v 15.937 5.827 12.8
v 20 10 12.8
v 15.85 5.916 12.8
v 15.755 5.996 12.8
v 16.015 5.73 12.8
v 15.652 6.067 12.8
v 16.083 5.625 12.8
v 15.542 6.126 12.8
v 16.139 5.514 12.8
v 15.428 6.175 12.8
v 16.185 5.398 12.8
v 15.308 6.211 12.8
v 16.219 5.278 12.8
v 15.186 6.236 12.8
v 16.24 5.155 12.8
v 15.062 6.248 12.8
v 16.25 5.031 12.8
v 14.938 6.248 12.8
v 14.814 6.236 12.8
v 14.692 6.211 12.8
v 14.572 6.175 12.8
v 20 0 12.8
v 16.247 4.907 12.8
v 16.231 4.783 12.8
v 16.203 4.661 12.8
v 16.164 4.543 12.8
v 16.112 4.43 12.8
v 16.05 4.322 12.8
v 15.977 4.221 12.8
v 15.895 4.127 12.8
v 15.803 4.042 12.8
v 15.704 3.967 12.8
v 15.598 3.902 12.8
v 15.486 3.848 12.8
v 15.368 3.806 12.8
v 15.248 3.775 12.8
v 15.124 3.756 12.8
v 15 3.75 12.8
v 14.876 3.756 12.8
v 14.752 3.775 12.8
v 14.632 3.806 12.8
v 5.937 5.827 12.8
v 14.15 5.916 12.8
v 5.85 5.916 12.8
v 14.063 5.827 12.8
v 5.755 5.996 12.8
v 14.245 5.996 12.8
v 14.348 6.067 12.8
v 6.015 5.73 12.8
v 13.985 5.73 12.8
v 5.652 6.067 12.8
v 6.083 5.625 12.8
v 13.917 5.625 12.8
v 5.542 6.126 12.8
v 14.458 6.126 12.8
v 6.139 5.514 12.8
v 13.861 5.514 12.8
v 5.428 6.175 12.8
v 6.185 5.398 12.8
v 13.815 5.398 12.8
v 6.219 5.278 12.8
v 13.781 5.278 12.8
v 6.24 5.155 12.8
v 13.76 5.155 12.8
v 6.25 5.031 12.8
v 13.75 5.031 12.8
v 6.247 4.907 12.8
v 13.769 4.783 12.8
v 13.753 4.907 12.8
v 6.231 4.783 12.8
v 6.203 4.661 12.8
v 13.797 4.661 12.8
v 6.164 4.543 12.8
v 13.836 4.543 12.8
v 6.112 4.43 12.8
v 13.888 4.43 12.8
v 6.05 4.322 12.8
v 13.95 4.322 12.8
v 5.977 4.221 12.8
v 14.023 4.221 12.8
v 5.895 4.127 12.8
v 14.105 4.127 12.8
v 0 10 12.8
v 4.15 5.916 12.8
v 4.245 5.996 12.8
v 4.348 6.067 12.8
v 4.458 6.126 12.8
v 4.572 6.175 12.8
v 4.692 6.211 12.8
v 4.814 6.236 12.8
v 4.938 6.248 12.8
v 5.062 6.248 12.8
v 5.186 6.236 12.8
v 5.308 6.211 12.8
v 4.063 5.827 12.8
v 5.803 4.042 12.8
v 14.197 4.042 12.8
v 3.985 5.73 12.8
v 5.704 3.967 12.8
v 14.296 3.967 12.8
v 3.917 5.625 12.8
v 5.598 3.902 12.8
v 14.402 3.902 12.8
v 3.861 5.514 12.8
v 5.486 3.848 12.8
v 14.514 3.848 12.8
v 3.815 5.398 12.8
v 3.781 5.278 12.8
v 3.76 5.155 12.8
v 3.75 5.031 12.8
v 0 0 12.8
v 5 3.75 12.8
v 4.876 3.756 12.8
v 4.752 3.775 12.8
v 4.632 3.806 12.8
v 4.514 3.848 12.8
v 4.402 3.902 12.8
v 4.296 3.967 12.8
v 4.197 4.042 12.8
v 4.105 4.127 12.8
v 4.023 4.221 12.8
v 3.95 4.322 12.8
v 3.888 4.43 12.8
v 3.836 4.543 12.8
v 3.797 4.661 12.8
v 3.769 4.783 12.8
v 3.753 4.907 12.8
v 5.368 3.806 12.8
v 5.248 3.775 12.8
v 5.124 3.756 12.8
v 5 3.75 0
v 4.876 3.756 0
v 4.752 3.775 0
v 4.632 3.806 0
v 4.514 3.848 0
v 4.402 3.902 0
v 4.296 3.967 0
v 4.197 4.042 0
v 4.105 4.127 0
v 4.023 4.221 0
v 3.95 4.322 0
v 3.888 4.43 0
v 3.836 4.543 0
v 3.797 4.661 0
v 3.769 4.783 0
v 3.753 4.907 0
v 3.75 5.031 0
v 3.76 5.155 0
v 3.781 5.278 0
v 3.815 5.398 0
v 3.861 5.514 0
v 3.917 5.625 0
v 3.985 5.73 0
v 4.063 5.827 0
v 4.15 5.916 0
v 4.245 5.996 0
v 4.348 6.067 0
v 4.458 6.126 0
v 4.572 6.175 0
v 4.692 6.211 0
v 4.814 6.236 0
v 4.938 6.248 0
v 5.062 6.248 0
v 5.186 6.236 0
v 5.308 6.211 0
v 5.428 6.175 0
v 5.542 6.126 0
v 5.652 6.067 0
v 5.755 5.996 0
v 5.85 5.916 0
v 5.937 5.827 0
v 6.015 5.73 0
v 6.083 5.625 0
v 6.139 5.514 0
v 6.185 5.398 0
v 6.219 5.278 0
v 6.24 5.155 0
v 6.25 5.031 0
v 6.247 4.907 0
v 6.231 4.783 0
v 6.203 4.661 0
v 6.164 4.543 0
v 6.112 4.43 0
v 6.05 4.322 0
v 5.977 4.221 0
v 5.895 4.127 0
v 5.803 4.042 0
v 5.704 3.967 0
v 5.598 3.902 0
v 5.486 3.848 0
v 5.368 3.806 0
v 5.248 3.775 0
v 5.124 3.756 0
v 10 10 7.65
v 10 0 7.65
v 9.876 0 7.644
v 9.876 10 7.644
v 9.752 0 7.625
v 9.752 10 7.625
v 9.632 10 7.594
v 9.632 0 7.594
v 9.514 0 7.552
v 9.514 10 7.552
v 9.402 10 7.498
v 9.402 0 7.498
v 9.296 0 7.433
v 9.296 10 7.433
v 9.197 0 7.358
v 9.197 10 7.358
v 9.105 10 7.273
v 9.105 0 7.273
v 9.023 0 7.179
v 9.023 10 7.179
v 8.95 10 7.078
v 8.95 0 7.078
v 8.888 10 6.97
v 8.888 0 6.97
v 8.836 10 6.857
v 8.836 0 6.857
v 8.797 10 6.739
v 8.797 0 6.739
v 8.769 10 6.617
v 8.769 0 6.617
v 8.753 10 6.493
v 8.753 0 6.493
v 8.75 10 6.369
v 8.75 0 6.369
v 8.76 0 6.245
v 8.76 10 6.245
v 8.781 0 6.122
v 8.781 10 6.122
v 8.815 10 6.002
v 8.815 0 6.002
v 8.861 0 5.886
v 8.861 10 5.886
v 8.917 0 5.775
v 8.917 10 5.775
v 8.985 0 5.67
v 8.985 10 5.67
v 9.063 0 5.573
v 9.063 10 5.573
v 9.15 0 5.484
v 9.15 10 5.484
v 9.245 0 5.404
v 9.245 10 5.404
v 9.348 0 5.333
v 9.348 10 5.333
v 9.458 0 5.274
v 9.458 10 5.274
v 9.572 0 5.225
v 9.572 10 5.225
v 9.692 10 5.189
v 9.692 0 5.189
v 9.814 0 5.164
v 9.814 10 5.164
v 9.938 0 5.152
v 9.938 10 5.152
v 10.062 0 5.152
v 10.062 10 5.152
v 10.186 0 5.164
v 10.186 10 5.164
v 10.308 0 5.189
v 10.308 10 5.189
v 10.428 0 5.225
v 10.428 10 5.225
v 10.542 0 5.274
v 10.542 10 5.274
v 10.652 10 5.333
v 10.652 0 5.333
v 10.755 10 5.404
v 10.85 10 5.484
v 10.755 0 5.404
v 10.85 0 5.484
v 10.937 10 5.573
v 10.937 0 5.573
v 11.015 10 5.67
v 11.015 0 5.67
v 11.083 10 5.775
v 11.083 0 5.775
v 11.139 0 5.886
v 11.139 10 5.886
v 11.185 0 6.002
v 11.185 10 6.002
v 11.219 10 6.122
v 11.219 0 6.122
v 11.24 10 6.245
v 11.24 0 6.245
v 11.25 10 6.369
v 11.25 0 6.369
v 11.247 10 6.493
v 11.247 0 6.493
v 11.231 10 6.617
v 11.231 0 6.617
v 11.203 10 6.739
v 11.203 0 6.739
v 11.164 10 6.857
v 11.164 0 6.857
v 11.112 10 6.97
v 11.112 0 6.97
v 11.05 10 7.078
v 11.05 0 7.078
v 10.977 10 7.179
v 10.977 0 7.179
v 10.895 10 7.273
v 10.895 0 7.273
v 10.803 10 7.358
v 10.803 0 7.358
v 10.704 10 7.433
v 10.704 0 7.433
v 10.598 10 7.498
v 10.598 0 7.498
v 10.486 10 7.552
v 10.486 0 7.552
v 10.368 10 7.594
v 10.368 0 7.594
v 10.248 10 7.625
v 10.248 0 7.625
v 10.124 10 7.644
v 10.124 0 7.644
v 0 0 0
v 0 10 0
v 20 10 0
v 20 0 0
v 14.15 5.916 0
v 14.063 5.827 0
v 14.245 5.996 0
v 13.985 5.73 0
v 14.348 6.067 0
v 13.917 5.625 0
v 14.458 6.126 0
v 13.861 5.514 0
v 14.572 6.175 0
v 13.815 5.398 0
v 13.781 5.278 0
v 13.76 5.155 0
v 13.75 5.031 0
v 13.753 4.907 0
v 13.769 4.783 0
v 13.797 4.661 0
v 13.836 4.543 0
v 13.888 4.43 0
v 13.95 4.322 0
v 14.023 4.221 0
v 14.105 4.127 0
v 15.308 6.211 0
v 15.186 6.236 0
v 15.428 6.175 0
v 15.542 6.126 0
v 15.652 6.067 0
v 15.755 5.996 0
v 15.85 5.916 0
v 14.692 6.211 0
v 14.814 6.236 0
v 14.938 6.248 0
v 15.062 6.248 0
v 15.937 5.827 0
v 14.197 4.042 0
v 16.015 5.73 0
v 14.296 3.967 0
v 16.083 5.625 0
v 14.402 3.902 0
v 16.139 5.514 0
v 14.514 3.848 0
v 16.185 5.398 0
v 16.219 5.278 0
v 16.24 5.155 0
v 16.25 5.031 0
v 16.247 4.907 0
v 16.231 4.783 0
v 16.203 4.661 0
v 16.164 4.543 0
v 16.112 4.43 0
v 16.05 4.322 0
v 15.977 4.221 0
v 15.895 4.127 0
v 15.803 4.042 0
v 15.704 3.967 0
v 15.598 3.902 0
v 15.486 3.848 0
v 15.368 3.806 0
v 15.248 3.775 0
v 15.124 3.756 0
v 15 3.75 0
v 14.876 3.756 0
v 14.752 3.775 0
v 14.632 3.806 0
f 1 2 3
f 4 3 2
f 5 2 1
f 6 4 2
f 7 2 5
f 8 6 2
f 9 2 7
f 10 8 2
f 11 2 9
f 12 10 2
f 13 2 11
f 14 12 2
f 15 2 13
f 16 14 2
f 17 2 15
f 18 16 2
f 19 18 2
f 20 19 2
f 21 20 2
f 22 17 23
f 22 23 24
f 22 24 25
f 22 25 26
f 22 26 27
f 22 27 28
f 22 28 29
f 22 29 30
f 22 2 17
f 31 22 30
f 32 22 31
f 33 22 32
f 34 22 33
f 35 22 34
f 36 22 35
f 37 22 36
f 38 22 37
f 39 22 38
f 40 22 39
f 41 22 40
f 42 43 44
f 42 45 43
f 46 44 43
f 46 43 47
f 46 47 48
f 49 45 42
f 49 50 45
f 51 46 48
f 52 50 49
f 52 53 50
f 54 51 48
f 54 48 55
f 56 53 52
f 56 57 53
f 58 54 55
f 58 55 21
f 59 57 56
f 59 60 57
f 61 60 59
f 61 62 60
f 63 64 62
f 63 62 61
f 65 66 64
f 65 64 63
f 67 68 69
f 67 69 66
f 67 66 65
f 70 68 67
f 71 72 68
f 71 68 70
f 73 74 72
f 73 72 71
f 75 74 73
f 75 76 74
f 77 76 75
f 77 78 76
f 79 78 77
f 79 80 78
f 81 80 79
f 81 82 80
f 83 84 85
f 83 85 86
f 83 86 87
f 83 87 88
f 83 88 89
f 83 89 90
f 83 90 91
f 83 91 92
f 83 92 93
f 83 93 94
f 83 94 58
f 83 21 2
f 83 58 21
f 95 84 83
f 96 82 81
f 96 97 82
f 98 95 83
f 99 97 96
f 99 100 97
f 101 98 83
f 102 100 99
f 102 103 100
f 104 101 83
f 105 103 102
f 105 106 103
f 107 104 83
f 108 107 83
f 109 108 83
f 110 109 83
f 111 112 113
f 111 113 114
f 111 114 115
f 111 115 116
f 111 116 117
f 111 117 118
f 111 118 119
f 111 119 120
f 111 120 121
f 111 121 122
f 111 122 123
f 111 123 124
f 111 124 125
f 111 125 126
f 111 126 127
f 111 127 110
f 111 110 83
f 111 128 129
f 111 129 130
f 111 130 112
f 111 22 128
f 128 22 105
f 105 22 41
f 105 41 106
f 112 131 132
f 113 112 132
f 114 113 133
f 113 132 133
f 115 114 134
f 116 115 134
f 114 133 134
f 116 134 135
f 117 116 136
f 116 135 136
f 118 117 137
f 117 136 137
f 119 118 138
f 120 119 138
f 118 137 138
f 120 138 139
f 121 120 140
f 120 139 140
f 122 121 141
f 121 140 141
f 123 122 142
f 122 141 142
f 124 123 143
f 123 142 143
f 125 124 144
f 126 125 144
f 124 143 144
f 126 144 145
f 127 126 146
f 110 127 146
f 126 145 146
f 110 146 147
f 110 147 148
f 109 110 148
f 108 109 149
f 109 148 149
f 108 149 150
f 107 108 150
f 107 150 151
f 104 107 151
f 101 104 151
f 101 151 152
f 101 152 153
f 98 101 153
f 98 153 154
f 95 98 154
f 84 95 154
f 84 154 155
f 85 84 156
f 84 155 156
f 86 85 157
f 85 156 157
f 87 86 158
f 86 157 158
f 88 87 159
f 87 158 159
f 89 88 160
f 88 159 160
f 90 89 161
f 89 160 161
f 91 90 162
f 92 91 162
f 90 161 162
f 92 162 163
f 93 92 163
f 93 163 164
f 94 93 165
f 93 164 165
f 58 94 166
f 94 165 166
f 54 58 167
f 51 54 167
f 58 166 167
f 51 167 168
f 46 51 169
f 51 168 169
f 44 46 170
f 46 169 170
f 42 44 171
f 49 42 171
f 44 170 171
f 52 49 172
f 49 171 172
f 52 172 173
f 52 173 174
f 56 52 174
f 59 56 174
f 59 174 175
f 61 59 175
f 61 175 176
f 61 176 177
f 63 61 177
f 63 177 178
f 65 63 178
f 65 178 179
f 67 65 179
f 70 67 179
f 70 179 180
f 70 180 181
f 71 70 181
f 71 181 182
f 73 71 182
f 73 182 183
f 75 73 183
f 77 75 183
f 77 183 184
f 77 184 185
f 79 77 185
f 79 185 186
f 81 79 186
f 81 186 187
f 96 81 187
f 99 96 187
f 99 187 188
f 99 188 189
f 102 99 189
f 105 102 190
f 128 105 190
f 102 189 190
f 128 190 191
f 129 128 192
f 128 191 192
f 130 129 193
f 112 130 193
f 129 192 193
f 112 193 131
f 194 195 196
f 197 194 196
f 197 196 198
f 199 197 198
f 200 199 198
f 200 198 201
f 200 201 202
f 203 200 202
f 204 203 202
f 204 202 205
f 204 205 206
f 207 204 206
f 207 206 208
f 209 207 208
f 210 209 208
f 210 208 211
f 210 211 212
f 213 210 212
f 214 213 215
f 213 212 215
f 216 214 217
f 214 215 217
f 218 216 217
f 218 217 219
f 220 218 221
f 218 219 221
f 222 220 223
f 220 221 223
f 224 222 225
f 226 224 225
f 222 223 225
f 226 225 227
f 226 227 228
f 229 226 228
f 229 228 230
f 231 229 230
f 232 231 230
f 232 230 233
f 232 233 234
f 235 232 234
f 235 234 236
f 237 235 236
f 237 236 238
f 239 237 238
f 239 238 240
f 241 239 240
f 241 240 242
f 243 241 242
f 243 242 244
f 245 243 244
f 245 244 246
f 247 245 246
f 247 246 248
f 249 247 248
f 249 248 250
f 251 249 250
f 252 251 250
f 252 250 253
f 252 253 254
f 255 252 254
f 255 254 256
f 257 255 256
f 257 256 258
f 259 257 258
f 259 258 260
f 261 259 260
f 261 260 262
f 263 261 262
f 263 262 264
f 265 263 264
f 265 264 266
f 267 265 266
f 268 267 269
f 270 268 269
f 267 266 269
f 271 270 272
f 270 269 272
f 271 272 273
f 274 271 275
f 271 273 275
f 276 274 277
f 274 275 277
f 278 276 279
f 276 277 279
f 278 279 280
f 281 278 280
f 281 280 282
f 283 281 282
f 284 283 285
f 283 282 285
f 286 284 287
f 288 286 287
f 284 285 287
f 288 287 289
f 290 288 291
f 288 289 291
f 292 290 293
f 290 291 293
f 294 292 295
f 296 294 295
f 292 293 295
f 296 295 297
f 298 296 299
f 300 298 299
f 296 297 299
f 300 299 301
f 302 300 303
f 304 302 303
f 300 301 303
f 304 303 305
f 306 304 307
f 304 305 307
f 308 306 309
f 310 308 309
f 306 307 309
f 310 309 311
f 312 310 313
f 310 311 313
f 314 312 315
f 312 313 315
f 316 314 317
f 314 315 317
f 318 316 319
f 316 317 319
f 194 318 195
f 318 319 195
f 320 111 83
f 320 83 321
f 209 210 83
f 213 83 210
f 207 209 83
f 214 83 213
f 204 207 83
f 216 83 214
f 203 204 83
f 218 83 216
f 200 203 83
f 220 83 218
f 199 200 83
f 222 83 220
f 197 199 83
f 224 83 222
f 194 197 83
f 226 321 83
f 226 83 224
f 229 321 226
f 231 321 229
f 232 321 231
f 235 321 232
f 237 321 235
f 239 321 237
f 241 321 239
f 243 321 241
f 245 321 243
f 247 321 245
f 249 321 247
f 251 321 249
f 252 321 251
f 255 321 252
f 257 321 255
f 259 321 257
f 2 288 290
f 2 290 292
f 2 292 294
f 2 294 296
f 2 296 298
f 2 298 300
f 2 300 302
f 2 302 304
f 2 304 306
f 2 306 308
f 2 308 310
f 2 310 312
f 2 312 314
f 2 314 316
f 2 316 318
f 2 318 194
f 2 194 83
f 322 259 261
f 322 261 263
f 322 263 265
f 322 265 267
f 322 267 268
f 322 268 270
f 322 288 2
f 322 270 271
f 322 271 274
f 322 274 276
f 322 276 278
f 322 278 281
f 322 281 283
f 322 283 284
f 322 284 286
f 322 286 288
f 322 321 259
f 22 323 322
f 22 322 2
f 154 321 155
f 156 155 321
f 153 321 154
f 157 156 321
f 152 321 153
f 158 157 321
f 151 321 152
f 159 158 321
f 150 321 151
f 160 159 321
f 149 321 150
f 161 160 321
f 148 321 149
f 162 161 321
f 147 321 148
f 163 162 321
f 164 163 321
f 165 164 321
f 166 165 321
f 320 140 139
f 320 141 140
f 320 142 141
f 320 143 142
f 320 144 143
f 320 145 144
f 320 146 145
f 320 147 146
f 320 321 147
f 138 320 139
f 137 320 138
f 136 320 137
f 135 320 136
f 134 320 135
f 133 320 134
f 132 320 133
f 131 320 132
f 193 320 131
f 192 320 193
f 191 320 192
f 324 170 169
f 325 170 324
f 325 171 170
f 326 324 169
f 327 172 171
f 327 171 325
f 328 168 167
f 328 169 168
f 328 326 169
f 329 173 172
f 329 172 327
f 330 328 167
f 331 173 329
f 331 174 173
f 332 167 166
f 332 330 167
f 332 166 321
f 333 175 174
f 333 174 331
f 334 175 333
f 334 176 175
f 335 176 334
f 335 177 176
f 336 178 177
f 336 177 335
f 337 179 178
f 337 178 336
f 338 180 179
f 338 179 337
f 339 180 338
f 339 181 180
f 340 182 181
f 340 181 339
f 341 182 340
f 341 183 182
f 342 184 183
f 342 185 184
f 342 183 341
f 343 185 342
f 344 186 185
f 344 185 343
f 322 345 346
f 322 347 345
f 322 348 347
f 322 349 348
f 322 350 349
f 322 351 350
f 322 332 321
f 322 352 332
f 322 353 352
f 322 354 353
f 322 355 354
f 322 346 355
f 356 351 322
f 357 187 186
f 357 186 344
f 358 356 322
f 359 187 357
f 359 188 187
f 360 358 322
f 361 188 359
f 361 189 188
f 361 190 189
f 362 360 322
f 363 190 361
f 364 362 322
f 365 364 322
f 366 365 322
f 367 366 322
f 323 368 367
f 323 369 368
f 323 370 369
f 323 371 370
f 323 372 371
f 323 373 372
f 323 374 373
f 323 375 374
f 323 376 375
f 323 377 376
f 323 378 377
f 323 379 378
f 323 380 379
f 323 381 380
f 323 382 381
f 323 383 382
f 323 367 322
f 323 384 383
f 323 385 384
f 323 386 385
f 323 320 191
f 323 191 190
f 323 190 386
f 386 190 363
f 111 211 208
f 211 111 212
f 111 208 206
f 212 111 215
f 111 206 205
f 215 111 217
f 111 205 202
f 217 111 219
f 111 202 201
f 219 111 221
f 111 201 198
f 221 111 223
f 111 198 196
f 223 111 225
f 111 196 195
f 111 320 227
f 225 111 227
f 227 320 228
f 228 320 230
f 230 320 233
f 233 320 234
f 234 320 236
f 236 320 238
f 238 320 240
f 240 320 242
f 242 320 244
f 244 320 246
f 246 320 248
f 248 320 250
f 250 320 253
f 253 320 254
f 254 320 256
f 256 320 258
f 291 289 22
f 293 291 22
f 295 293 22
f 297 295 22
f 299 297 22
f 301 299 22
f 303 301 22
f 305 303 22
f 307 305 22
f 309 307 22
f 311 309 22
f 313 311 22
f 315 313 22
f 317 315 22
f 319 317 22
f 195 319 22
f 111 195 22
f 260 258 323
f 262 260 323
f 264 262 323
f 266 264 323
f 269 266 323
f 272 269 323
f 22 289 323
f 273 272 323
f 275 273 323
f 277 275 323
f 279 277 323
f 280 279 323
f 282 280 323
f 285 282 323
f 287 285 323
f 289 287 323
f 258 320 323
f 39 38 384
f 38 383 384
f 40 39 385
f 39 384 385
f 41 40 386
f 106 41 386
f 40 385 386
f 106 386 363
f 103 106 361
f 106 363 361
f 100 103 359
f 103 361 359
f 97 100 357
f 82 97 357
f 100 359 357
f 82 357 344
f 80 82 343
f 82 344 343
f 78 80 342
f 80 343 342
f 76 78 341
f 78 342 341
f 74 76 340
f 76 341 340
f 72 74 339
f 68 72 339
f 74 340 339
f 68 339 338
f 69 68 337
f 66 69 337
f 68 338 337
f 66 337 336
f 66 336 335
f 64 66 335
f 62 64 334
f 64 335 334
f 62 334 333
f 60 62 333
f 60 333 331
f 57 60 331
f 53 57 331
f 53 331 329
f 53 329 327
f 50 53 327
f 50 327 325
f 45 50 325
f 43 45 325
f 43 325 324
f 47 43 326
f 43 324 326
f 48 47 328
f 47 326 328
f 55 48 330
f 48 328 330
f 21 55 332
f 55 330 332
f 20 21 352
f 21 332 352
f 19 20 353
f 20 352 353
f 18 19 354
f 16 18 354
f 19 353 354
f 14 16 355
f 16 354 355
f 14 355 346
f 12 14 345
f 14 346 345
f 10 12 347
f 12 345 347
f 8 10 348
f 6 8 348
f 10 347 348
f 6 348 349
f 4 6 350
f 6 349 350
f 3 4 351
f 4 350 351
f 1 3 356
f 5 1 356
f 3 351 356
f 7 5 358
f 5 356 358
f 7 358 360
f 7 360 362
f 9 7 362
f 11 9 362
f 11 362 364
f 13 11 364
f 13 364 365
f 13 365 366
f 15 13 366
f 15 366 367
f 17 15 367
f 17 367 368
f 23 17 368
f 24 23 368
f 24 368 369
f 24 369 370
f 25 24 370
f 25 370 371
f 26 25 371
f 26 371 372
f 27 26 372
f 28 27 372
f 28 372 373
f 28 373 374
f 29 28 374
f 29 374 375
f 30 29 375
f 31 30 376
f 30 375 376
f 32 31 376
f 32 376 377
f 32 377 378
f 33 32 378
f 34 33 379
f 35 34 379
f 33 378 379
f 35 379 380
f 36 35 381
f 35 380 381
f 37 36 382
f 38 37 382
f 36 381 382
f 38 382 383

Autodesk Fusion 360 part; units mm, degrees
sketch "Sketch1" plane through (0, 0, 0) normal (0, 1, 0) x (1, 0, 0)
  line L0 (0, 0) -> (20, 0)
  line L1 (20, 0) -> (20, -12.8)
  line L2 (20, -12.8) -> (0, -12.8)
  line L3 (0, -12.8) -> (0, 0)
  dimension "d1" = 20
  dimension "d2" = 12.8
extrude "Extrude1" add sketch "Sketch1" along normal blind 10
sketch "Sketch2" plane through (0, 10, 0) normal (0, 1, 0) x (-1, 0, 0)
  line L0 (0, 12.8) -> (-20, 12.8)
  line L1 (-20, 12.8) -> (-20, 0)
  line L2 (-20, 0) -> (0, 0)
  line L3 (0, 0) -> (0, 12.8)
  line L4 (-10, 0) -> (-10, 12.8) construction
  line L5 (0, 6.4) -> (-20, 6.4) construction
  point P0 (-10, 6.4)
hole "Hole1" at (10, 10, 6.4) direction (0, -1, 0) diameter 2.5 end through all
sketch "Sketch3" plane through (0, 0, 12.8) normal (0, 0, 1) x (1, 0, 0)
  line L0 (0, 0) -> (20, 0)
  line L1 (20, 0) -> (20, 10)
  line L2 (20, 10) -> (0, 10)
  line L3 (0, 10) -> (0, 0)
  line L4 (0, 5) -> (20, 5) construction
  line L5 (5, 2.6) -> (5, 7.2) construction
  line L6 (15, 2.6) -> (15, 7.2) construction
  point P0 (5, 5)
  point P1 (15, 5)
  dimension "d8" = 10
  dimension "d9" = 5
  dimension "d16" = 5
hole "Hole4" at (5, 5, 12.8) direction (0, 0, -1) diameter 2.5 end through all
hole "Hole5" at (15, 5, 12.8) direction (0, 0, -1) diameter 2.5 end through all
